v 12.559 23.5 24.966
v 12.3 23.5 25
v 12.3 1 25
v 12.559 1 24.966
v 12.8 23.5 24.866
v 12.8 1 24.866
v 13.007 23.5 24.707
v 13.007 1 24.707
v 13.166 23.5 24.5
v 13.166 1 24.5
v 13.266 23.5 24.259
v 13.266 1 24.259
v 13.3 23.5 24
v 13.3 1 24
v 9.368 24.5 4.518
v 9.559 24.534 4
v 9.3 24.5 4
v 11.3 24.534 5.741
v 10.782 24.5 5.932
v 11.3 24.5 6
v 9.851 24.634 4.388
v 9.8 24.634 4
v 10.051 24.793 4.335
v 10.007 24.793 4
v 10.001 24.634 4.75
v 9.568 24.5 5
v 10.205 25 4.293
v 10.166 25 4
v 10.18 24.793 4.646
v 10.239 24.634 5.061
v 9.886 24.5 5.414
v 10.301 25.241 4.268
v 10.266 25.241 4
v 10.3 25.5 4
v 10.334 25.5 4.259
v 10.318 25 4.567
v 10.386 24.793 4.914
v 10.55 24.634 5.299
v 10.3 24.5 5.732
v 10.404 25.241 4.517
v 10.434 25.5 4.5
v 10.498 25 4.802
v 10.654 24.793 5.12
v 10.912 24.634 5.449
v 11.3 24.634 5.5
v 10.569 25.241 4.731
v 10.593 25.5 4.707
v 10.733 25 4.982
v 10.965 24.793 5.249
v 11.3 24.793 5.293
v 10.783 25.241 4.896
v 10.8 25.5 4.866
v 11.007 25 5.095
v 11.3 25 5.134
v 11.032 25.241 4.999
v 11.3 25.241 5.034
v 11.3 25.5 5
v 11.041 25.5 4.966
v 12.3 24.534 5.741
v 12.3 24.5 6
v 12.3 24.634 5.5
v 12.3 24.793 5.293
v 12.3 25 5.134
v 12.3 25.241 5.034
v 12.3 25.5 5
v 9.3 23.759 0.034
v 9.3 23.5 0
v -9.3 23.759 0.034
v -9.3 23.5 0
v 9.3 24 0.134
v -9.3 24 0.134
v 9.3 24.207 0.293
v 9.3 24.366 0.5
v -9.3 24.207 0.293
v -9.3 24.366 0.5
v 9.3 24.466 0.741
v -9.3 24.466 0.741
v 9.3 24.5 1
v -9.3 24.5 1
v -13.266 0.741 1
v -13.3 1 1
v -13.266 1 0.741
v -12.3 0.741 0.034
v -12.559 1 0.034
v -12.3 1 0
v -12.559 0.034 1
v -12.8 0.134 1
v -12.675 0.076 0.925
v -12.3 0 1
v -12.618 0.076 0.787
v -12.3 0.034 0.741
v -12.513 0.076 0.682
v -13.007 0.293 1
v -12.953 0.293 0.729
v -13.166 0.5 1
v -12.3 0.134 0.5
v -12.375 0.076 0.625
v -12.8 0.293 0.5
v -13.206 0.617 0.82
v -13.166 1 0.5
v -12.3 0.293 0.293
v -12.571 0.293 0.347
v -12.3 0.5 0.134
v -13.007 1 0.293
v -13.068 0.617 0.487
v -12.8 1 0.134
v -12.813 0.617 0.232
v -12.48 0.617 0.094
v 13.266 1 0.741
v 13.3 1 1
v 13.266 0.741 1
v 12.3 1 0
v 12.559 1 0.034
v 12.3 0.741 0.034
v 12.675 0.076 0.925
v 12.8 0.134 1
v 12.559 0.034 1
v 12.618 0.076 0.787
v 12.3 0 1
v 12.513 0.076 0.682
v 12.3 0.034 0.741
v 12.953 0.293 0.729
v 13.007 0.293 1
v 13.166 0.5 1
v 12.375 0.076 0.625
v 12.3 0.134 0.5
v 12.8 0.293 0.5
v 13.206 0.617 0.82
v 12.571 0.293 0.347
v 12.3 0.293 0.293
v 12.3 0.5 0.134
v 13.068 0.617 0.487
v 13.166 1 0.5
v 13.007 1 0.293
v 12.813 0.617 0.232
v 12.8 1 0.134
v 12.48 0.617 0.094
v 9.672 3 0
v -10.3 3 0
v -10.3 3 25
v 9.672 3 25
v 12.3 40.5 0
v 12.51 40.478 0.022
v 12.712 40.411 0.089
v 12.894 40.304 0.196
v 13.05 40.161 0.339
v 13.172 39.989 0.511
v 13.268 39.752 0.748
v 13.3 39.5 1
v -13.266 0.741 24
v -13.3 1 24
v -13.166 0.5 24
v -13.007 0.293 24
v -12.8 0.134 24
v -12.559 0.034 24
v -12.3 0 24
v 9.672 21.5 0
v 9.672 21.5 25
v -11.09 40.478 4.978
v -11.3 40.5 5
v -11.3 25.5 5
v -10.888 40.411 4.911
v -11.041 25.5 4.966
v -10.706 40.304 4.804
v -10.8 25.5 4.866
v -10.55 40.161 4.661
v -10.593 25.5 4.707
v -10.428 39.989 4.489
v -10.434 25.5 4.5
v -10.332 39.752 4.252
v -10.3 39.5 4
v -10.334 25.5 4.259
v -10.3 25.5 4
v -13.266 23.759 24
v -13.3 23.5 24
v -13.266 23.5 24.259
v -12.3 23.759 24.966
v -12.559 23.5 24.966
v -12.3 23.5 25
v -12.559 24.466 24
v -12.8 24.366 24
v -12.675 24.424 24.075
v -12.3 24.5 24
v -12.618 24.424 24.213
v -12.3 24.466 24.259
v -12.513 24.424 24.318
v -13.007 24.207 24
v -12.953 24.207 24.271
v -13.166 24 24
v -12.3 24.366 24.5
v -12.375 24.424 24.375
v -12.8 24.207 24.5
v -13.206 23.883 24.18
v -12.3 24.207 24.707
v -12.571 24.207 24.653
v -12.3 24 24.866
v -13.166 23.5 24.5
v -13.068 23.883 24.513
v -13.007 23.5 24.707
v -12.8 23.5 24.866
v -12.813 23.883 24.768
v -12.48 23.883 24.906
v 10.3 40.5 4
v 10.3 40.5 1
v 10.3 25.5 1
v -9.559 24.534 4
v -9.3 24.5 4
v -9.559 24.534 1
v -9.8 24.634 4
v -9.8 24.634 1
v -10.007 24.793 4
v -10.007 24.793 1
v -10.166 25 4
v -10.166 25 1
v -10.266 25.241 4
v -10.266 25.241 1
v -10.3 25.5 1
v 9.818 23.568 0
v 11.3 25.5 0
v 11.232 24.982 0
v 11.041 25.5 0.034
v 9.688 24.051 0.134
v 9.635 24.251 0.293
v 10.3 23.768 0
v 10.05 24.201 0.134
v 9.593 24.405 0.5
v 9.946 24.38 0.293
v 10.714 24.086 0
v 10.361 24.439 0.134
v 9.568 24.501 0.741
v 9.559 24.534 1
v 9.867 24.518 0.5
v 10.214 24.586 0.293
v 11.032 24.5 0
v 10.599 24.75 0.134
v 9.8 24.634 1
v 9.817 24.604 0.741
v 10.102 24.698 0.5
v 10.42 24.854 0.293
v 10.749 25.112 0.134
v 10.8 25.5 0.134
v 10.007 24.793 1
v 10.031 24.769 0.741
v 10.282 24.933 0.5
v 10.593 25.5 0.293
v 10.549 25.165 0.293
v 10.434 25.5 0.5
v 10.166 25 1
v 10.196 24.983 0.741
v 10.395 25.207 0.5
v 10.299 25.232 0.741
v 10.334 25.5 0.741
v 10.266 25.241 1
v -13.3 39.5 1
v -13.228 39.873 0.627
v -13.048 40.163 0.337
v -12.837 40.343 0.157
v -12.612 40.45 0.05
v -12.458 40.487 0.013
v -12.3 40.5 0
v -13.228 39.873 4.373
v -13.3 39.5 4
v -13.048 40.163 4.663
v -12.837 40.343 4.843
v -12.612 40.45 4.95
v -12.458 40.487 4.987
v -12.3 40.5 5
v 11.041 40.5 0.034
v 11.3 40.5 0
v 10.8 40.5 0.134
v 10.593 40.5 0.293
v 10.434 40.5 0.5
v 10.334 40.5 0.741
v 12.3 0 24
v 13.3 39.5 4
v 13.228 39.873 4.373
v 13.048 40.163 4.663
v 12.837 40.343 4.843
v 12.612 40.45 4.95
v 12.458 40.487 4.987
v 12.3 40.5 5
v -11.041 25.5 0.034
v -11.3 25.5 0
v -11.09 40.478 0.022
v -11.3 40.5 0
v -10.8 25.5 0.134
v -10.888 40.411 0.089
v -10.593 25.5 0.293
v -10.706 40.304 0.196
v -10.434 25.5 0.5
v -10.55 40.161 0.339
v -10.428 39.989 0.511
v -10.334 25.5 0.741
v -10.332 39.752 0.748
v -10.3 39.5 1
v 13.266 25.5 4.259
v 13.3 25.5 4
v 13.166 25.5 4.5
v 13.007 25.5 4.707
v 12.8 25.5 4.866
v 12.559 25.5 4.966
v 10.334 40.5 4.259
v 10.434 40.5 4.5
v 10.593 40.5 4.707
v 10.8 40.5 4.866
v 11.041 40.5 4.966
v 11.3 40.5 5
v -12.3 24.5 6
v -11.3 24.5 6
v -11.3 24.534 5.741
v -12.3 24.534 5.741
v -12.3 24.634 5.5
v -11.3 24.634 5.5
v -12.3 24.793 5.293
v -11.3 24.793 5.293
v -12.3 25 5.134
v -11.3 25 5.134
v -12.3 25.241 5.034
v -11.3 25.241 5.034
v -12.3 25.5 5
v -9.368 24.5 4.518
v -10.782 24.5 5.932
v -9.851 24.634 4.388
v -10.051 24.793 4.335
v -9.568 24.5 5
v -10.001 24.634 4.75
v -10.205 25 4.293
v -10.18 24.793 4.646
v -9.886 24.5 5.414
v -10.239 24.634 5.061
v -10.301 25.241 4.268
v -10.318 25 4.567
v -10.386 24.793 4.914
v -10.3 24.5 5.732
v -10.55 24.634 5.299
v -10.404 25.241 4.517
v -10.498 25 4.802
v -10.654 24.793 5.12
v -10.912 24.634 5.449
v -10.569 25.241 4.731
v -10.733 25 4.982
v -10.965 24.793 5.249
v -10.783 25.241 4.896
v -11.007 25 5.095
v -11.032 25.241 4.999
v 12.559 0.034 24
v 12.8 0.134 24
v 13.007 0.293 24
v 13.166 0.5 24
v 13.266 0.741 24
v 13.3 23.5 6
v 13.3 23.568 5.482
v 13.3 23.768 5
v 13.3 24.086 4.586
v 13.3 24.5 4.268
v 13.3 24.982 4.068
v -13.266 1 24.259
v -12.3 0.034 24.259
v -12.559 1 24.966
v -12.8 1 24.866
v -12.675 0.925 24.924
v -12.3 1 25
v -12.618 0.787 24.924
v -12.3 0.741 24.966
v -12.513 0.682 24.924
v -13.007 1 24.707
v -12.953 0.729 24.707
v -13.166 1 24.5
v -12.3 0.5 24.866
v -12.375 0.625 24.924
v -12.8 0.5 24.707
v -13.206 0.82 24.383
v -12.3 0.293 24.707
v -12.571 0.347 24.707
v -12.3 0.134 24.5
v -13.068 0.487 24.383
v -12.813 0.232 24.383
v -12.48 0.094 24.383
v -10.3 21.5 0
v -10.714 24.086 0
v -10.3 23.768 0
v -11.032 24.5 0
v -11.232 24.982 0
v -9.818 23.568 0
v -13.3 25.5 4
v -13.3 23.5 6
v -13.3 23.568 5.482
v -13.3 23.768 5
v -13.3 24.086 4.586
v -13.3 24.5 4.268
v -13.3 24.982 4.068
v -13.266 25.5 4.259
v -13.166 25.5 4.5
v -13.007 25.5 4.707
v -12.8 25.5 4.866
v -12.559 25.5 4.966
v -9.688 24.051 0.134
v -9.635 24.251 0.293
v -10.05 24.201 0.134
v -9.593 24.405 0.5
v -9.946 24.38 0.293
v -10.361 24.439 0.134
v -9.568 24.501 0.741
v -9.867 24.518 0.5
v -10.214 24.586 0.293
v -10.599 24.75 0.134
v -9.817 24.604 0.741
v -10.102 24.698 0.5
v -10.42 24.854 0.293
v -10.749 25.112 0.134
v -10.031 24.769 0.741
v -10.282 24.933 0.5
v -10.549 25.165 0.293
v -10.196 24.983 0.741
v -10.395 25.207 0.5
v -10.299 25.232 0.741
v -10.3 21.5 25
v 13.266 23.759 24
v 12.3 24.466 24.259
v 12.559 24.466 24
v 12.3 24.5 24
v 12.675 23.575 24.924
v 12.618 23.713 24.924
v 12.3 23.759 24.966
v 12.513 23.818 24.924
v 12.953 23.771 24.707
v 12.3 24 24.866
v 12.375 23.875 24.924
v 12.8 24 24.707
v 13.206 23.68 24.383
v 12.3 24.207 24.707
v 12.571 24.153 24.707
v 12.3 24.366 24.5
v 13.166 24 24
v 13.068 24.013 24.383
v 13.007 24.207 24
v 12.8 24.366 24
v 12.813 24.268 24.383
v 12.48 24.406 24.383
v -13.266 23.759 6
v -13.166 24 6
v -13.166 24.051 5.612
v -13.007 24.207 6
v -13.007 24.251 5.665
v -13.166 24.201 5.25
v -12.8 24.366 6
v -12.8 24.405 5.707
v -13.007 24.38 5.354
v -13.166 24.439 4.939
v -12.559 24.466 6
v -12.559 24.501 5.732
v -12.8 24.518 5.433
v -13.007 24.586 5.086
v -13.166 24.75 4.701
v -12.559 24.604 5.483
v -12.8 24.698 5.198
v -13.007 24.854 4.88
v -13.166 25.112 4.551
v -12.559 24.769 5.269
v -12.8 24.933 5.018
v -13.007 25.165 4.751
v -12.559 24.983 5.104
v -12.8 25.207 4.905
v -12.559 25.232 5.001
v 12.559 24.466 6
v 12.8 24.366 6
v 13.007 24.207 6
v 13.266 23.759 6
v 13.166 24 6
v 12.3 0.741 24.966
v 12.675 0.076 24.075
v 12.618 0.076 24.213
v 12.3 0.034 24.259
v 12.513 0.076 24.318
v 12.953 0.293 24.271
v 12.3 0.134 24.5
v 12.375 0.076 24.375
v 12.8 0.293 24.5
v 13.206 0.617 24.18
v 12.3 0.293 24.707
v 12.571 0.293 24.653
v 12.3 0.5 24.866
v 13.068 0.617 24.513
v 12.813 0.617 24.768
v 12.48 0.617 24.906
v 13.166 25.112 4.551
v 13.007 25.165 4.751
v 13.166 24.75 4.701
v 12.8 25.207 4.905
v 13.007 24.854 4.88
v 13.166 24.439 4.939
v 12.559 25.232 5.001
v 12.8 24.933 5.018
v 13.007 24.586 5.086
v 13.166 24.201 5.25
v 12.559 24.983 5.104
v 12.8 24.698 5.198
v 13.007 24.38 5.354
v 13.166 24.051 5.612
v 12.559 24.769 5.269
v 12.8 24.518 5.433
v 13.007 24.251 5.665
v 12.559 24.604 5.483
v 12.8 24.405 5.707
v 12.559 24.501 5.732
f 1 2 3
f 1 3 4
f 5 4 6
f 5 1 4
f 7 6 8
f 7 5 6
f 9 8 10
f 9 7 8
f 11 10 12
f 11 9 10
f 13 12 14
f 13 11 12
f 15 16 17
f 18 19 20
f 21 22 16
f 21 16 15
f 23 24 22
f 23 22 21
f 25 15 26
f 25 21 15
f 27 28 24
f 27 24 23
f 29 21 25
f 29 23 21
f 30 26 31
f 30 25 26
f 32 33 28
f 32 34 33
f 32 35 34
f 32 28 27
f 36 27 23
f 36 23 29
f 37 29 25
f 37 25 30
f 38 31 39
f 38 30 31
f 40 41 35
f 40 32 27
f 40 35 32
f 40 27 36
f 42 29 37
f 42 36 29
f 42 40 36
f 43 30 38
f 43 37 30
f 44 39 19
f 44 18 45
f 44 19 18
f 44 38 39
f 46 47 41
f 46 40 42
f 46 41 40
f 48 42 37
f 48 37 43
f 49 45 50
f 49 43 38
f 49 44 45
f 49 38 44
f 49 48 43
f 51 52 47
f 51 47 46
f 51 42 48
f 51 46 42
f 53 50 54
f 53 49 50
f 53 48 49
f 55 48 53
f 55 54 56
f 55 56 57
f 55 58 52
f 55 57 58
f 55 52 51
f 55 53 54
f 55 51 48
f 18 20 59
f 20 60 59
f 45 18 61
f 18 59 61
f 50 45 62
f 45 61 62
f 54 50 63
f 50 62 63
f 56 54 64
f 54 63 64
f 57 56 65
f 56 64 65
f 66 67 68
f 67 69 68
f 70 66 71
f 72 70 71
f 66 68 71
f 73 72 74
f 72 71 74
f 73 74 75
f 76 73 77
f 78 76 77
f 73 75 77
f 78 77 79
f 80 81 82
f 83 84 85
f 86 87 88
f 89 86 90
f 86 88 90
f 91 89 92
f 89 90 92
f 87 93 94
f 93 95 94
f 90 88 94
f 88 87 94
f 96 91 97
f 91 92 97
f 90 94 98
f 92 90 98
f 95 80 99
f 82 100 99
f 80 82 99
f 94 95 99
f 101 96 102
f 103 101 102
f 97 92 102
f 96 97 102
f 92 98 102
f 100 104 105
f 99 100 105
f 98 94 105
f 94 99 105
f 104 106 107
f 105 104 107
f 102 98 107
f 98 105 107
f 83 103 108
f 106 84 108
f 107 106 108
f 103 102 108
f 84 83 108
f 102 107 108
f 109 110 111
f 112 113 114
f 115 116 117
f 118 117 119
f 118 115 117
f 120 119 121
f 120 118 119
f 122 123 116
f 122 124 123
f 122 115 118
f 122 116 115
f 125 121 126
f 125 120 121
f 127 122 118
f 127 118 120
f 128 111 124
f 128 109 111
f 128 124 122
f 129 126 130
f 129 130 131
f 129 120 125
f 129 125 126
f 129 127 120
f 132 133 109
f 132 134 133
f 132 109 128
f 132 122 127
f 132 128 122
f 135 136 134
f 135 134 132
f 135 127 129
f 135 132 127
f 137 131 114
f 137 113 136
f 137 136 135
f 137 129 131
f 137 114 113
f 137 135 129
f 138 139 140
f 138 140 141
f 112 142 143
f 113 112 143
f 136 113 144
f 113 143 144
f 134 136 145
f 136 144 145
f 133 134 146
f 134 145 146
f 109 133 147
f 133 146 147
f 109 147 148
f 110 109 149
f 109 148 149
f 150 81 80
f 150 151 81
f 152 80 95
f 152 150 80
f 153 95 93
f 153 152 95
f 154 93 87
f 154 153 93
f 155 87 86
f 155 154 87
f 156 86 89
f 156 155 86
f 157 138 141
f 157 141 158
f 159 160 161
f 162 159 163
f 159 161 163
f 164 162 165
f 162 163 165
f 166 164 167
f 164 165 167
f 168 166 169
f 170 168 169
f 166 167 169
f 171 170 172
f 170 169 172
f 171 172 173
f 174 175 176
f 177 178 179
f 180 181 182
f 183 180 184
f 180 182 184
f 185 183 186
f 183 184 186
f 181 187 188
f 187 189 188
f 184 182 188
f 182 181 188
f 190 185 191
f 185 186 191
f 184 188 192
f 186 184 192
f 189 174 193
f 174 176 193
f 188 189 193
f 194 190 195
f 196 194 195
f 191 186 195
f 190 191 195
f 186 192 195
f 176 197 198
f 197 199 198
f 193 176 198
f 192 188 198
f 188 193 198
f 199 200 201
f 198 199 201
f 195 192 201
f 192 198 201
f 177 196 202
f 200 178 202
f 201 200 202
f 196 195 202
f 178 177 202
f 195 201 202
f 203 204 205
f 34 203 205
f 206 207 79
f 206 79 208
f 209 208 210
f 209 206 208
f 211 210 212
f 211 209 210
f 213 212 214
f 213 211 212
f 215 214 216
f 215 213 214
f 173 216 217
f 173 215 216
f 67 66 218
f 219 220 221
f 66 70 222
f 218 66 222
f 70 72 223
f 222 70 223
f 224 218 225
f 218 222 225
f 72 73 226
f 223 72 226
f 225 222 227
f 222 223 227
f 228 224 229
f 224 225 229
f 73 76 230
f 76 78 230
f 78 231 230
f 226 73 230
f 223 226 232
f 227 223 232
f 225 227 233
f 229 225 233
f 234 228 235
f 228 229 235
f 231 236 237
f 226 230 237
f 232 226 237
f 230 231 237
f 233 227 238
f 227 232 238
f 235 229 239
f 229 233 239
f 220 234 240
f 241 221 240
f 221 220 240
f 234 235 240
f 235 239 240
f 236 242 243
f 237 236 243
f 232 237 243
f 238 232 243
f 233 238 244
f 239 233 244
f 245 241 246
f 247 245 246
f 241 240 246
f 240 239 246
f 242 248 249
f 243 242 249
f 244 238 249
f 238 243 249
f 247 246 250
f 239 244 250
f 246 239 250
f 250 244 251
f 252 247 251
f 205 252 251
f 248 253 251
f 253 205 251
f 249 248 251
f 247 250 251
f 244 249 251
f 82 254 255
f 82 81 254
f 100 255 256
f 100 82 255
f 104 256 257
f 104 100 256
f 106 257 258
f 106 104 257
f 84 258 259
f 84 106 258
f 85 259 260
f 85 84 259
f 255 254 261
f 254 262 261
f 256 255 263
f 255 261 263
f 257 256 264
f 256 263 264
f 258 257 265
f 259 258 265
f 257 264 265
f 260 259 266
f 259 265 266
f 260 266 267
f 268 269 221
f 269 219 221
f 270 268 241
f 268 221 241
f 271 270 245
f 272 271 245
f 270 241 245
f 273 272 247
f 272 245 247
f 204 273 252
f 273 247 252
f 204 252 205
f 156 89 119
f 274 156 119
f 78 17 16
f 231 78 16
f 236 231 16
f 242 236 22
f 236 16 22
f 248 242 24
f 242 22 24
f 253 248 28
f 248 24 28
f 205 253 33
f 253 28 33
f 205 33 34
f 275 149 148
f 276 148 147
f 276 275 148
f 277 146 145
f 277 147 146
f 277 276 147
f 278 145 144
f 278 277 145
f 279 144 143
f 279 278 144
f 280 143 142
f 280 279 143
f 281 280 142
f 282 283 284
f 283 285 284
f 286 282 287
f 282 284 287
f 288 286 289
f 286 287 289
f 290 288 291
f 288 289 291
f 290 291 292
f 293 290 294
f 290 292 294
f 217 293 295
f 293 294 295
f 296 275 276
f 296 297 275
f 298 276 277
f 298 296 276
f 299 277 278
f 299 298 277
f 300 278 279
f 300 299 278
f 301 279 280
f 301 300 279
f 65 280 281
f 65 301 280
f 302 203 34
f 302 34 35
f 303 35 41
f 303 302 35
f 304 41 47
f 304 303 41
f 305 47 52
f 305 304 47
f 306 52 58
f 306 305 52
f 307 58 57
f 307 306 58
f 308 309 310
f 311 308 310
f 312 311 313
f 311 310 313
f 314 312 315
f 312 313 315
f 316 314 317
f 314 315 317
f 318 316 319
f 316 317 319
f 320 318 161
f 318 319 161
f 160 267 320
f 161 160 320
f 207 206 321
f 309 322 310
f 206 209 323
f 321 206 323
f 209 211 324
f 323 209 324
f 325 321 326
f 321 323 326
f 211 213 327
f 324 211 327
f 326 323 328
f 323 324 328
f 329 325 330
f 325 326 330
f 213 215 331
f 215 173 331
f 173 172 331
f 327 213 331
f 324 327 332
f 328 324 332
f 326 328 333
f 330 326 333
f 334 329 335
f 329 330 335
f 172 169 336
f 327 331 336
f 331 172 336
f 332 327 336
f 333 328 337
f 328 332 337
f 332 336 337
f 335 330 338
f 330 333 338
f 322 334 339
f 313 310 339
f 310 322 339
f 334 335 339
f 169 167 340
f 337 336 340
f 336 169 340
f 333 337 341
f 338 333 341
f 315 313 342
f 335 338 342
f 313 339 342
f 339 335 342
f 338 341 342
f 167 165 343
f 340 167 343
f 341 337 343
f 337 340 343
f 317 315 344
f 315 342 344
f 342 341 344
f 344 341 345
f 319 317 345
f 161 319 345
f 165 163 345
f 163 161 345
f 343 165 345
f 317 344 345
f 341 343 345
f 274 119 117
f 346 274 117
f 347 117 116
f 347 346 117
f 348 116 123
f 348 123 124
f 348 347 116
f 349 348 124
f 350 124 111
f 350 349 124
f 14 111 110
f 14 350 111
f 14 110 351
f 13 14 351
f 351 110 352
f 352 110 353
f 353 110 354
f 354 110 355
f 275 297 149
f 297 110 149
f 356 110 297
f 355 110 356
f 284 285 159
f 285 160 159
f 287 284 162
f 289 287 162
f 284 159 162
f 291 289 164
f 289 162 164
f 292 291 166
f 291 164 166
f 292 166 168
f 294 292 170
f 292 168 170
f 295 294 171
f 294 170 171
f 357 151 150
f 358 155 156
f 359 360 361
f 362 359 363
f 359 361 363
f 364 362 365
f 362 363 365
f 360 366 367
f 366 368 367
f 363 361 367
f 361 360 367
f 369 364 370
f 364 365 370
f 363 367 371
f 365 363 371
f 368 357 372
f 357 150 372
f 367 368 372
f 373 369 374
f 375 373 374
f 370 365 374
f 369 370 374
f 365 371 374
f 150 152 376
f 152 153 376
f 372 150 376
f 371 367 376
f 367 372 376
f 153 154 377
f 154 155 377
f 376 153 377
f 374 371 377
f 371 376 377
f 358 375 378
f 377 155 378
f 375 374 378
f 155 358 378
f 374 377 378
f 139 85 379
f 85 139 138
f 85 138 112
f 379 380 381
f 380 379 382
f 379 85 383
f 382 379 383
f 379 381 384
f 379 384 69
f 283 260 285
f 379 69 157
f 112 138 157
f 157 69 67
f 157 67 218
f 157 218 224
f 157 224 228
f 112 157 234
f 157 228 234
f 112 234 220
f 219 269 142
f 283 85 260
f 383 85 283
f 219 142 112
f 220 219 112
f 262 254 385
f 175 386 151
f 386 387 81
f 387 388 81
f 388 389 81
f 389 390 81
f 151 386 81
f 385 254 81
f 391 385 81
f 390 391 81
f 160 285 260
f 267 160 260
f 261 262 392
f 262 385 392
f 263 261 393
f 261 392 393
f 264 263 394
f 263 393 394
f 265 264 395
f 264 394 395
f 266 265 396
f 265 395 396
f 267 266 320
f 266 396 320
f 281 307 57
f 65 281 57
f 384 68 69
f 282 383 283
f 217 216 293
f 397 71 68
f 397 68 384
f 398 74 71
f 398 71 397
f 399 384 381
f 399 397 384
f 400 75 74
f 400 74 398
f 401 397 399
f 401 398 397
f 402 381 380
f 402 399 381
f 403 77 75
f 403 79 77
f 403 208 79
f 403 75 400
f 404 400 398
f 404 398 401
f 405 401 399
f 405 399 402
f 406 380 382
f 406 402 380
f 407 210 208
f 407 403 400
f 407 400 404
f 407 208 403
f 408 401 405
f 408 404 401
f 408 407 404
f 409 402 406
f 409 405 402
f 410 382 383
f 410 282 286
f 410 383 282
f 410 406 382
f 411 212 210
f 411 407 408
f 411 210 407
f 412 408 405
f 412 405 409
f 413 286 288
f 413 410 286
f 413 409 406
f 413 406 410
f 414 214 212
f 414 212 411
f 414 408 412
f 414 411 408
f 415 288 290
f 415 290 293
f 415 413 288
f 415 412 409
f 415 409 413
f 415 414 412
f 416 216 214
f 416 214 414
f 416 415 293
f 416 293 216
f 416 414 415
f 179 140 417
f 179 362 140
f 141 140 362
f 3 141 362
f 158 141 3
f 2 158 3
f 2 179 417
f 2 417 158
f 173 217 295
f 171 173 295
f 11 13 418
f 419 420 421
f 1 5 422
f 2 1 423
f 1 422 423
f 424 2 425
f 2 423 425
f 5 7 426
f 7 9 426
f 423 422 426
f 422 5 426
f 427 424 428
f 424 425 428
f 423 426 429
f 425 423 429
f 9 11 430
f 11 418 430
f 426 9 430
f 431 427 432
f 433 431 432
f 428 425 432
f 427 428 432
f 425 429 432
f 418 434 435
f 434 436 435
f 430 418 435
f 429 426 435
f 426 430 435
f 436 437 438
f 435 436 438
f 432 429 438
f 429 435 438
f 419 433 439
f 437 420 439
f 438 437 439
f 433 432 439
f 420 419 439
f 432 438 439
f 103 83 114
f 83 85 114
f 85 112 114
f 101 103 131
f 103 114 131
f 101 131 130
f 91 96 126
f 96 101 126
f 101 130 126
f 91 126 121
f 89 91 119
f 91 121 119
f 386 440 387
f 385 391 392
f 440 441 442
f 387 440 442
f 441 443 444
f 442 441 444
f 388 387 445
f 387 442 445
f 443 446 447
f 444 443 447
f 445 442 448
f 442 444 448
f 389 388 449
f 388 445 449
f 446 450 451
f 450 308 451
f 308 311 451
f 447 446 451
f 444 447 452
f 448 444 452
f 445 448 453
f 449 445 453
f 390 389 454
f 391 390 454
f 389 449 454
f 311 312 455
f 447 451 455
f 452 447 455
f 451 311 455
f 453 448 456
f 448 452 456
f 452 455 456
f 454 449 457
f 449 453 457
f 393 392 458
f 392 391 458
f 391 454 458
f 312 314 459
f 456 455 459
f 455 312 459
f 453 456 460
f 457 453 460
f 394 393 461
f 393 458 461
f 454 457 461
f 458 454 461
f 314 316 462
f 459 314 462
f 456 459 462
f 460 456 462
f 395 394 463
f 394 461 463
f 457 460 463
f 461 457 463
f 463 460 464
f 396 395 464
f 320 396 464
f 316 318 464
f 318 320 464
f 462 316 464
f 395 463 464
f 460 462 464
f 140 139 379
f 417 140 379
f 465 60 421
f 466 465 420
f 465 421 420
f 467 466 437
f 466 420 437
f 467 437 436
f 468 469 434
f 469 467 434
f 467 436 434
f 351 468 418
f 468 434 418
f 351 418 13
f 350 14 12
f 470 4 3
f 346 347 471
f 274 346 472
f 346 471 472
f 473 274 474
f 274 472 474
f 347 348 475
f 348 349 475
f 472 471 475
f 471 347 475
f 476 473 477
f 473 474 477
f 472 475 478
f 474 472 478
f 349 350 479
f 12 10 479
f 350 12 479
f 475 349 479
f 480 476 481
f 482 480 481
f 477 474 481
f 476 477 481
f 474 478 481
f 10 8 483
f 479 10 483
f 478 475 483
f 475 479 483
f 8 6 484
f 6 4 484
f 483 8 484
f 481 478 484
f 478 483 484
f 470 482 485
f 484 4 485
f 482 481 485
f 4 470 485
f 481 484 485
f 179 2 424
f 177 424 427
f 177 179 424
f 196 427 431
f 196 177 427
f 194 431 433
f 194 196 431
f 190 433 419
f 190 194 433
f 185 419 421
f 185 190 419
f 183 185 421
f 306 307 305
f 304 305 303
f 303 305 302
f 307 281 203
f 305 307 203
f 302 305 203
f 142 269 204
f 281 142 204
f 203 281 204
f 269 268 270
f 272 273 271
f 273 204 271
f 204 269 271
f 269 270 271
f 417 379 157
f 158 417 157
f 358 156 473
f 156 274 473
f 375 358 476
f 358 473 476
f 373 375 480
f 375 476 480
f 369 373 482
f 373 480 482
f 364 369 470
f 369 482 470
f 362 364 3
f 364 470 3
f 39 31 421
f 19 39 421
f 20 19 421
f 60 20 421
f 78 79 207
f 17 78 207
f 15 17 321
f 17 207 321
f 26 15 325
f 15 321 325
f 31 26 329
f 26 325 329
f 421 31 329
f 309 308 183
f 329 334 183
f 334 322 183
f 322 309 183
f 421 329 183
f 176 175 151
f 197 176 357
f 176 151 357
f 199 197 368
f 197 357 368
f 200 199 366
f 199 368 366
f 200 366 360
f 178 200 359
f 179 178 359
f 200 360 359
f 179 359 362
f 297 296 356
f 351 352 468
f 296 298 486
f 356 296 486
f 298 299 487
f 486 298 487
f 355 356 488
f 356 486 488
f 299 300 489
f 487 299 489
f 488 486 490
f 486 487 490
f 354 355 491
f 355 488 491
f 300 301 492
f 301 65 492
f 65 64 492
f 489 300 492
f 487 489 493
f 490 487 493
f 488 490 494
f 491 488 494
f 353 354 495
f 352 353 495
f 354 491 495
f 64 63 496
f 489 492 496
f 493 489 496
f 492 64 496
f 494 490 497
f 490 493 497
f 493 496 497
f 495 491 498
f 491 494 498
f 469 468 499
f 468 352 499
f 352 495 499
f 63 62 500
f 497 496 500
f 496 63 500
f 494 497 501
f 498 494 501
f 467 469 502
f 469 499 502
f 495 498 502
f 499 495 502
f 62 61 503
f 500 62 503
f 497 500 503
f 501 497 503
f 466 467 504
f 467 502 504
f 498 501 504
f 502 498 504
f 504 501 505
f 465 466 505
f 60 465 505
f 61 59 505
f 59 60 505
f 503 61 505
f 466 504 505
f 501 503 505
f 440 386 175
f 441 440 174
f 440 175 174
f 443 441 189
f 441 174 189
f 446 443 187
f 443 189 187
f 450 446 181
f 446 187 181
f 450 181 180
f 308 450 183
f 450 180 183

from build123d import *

# Parameters (mm, degrees)
F1_DEPTH = 25
F2_W     = 16
F2_H     = 20
F3_DEPTH = 26.601
F4_W     = 19.9722627059
F4_H     = 18.5
F5_DEPTH = 25.001
F6_R     = 1


with BuildPart() as f1:
    # F0 (on Top) → F1 (new body)
    with BuildSketch(Plane.XY):
        Polygon((-13.3, 40.5), (-13.3, 0), (0, 0), (13.3, 0), (13.3, 40.5), (10.3, 40.5), (10.3, 24.5), (0, 24.5), (-10.3, 24.5), (-10.3, 40.5), align=None)
    extrude(amount=F1_DEPTH)

    # F2 (on face) → F3 (cut, through all)
    with BuildSketch(Plane(origin=(-13.3, 0, 0), x_dir=(0, -1, 0), z_dir=(-1, 0, 0))):
        with Locations((-32.5, 15)):
            Rectangle(F2_W, F2_H)
    extrude(amount=-F3_DEPTH, mode=Mode.SUBTRACT)

    # F4 (on face) → F5 (cut, through all)
    with BuildSketch(Plane.XY):
        with Locations((-0.3138686471, 12.25)):
            Rectangle(F4_W, F4_H)
    extrude(amount=F5_DEPTH, mode=Mode.SUBTRACT)

    # F6
    f6_edges = [f1.edges().sort_by_distance(p)[0] for p in [
        (13.3, 20.25, 0),
        (13.3, 40.5, 2.5),
        (13.3, 32.5, 5),
        (13.3, 24.5, 15),
        (13.3, 12.25, 25),
        (13.3, 0, 12.5),
        (-13.3, 20.25, 0),
        (-13.3, 0, 12.5),
        (-13.3, 12.25, 25),
        (-13.3, 24.5, 15),
        (-13.3, 32.5, 5),
        (-13.3, 40.5, 2.5),
        (0, 0, 25),
        (0, 0, 0),
        (0, 24.5, 25),
        (0, 24.5, 0),
        (-11.8, 24.5, 5),
        (11.8, 24.5, 5),
        (10.3, 32.5, 5),
        (-10.3, 32.5, 0),
        (-10.3, 40.5, 2.5),
        (-10.3, 32.5, 5),
        (-10.3, 24.5, 2.5),
        (10.3, 32.5, 0),
        (10.3, 24.5, 2.5),
    ]]
    fillet(f6_edges, radius=F6_R)


solid = f1.part
